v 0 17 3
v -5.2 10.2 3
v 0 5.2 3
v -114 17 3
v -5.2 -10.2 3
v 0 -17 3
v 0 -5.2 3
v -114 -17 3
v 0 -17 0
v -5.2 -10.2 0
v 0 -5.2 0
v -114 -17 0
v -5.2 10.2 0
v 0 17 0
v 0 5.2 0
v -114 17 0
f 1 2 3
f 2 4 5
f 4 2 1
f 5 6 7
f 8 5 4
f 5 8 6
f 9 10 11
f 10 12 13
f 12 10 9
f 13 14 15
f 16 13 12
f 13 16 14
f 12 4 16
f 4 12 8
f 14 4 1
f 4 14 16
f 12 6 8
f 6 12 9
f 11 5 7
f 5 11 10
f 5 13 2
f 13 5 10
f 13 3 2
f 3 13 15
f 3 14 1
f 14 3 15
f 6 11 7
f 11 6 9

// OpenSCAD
// -*- mode: SCAD ; c-file-style: "ellemtel" ; coding: utf-8 -*-
//
// correctly sized simple shape to stack four picture 135 type film strips
//
// © 2018 Roland Sieker <ospalh@gmail.com>
// Licence: CC-BY-SA 4.0


// … to preview. You will get all parts when you click “Create Thing”.
part = "leftlid"; // [stack: Stapler, lid: Deckel, leftstack, rightstack, leftlif, rightlid]

// Set this to “render” and click on “Create Thing” when done with the setup.
preview = 1; // [0:render, 1:preview]
// not needed

l1 = 8*4.75;
ex = 3;
num = 6;
lld = l1*num;
ll = lld + ex;
ey = 1;
w1 = 35;
wst = w1+ey; // 9.2 mm + clearance
wld = w1-ey; // Make it fit between the plates without problems
h = 30; // I have a lot of film strips i want to stack

w = 1.2;  // Wall width

epl = wld + 2*w;
spl = 10;
spo = 20;
spsp = ll/4;

hl = 30;
hw = 10;

jl = 5;

/* [Hidden] */

// Done with the customizer

// *******************************************************
// Extra parameters. These can be changed reasonably safely.



p = 3;  // Bottom, top plate hight
c = 0.4;  // Clearance
angle = 60; // Overhangs much below 60° are a problem for me

// *******************************************************
// Some shortcuts. These shouldn’t be changed

tau = 2 * PI;  // π is still wrong. τ = circumference ÷ r

xy_factor = 1/tan(angle);
// To get from a hight to a horizontal width inclined correctly
z_factor = tan(angle);  // The other way around

he = h + 2*p;
spo2 = ll/2 - spo - spl;

some_distance = 50;
ms = 0.01;  // Muggeseggele.

// fn for differently sized objects and fs, fa; all for preview or rendering.
pna = 40;
pnb = 15;
pa = 5;
ps = 1;
rna = 180;
rnb = 30;
ra = 1;
rs = 0.1;
function na() = (preview) ? pna : rna;
function nb() = (preview) ? pnb : rnb;
$fs = (preview) ? ps : rs;
$fa = (preview) ? pa : ra;

// *******************************************************
// End setup



// *******************************************************
// Generate the parts

print_part();
// preview_parts();
// stack_parts();
// left_stack();
// right_stack();

module print_part()
{
   if ("stack" == part)
   {
      stack();
   }
   if ("leftstack" == part)
   {
      left_stack();
   }
   if ("rightstack" == part)
   {
      right_stack();
   }
   if ("lid" == part)
   {
      lid();
   }
   if ("leftlid" == part)
   {
      left_lid();
   }
   if ("rightlid" == part)
   {
      right_lid();
   }
}

module preview_parts()
{
   stack();
   translate([0, some_distance, 0])
   {
      lid();
   }
   translate([-2*jl, 2*some_distance, 0])
   {
      left_stack();
   }
   translate([+2*jl, some_distance, 0])
   {
      right_stack();
   }
   translate([-2*jl, 3*some_distance, 0])
   {
      left_lid();
   }
   translate([+2*jl, 3*some_distance, 0])
   {
      right_lid();
   }
}

module stack_parts()
{
   // intersection()
   {
      color("yellow")
      {
         stack();
      }
      translate([0,0, 3*p])
      {
         color("red")
         {
            lid();
         }
      }
   }
}

// *******************************************************
// Code for the parts themselves

module stack()
{
   translate([0,0,p/2])
   {
      cube([ll, wst, p], center=true);
   }
   plates();
   h_cube();
   mirror()
   {
      h_cube();
   }
   module h_cube()
   {
      translate([ll/2-ms-hw/2, 0, p/2])
      {
         cube([hw, hl, p], center=true);
      }

   }
}

module left_stack()
{
   intersection()
   {
      stack();
      left_joint(c/2);
   }
}

module right_stack()
{
   difference()
   {
      stack();
      left_joint(-c/2);
   }
}

module lid()
{
   translate([0,0,p/2])
   {
      cube([lld, wld, p], center=true);
   }
}




module left_lid()
{
   intersection()
   {
      lid();
      left_joint(c/2);
   }
}

module right_lid()
{
   difference()
   {
      lid();
      left_joint(-c/2);
   }
}


module left_joint(jc)
{
   translate([0, 0, -h])
   {
      linear_extrude(3*h)
      {
         polygon(ljp);
      }
   }
   ljp = [
      [-jl-jc, 2*jl+jc],
      [0, jl+jc],
      [0, ll],
      [-ll, ll],
      [-ll, -ll],
      [0, -ll],
      [0, -jl-jc],
      [-jl-jc, -2*jl-jc],
      [-jl-jc, 2*jl+jc]
      ];
}

module plates()
{
   end_plate();
   side_plate(0);
   side_plate(spsp);
   // side_plate(2*spsp);
   rotate(180)
   {
      side_plate(0);
      side_plate(spsp);
      // side_plate(2*spsp);
   }
   mirror()
   {
      end_plate();
      side_plate(0);
      side_plate(spsp);
      // side_plate(2*spsp);
      rotate(180)
      {
         side_plate(0);
         side_plate(spsp);
         // side_plate(2*spsp);
      }
   }
}

module end_plate()
{
   translate([ll/2-ms , -epl/4,0])
   {
      cube([w, epl/2, he]);
   }
}

module side_plate(xo)
{
   translate([spo2-xo, wst/2-ms,0])
   {
      cube([spl, w, he]);
   }
}
